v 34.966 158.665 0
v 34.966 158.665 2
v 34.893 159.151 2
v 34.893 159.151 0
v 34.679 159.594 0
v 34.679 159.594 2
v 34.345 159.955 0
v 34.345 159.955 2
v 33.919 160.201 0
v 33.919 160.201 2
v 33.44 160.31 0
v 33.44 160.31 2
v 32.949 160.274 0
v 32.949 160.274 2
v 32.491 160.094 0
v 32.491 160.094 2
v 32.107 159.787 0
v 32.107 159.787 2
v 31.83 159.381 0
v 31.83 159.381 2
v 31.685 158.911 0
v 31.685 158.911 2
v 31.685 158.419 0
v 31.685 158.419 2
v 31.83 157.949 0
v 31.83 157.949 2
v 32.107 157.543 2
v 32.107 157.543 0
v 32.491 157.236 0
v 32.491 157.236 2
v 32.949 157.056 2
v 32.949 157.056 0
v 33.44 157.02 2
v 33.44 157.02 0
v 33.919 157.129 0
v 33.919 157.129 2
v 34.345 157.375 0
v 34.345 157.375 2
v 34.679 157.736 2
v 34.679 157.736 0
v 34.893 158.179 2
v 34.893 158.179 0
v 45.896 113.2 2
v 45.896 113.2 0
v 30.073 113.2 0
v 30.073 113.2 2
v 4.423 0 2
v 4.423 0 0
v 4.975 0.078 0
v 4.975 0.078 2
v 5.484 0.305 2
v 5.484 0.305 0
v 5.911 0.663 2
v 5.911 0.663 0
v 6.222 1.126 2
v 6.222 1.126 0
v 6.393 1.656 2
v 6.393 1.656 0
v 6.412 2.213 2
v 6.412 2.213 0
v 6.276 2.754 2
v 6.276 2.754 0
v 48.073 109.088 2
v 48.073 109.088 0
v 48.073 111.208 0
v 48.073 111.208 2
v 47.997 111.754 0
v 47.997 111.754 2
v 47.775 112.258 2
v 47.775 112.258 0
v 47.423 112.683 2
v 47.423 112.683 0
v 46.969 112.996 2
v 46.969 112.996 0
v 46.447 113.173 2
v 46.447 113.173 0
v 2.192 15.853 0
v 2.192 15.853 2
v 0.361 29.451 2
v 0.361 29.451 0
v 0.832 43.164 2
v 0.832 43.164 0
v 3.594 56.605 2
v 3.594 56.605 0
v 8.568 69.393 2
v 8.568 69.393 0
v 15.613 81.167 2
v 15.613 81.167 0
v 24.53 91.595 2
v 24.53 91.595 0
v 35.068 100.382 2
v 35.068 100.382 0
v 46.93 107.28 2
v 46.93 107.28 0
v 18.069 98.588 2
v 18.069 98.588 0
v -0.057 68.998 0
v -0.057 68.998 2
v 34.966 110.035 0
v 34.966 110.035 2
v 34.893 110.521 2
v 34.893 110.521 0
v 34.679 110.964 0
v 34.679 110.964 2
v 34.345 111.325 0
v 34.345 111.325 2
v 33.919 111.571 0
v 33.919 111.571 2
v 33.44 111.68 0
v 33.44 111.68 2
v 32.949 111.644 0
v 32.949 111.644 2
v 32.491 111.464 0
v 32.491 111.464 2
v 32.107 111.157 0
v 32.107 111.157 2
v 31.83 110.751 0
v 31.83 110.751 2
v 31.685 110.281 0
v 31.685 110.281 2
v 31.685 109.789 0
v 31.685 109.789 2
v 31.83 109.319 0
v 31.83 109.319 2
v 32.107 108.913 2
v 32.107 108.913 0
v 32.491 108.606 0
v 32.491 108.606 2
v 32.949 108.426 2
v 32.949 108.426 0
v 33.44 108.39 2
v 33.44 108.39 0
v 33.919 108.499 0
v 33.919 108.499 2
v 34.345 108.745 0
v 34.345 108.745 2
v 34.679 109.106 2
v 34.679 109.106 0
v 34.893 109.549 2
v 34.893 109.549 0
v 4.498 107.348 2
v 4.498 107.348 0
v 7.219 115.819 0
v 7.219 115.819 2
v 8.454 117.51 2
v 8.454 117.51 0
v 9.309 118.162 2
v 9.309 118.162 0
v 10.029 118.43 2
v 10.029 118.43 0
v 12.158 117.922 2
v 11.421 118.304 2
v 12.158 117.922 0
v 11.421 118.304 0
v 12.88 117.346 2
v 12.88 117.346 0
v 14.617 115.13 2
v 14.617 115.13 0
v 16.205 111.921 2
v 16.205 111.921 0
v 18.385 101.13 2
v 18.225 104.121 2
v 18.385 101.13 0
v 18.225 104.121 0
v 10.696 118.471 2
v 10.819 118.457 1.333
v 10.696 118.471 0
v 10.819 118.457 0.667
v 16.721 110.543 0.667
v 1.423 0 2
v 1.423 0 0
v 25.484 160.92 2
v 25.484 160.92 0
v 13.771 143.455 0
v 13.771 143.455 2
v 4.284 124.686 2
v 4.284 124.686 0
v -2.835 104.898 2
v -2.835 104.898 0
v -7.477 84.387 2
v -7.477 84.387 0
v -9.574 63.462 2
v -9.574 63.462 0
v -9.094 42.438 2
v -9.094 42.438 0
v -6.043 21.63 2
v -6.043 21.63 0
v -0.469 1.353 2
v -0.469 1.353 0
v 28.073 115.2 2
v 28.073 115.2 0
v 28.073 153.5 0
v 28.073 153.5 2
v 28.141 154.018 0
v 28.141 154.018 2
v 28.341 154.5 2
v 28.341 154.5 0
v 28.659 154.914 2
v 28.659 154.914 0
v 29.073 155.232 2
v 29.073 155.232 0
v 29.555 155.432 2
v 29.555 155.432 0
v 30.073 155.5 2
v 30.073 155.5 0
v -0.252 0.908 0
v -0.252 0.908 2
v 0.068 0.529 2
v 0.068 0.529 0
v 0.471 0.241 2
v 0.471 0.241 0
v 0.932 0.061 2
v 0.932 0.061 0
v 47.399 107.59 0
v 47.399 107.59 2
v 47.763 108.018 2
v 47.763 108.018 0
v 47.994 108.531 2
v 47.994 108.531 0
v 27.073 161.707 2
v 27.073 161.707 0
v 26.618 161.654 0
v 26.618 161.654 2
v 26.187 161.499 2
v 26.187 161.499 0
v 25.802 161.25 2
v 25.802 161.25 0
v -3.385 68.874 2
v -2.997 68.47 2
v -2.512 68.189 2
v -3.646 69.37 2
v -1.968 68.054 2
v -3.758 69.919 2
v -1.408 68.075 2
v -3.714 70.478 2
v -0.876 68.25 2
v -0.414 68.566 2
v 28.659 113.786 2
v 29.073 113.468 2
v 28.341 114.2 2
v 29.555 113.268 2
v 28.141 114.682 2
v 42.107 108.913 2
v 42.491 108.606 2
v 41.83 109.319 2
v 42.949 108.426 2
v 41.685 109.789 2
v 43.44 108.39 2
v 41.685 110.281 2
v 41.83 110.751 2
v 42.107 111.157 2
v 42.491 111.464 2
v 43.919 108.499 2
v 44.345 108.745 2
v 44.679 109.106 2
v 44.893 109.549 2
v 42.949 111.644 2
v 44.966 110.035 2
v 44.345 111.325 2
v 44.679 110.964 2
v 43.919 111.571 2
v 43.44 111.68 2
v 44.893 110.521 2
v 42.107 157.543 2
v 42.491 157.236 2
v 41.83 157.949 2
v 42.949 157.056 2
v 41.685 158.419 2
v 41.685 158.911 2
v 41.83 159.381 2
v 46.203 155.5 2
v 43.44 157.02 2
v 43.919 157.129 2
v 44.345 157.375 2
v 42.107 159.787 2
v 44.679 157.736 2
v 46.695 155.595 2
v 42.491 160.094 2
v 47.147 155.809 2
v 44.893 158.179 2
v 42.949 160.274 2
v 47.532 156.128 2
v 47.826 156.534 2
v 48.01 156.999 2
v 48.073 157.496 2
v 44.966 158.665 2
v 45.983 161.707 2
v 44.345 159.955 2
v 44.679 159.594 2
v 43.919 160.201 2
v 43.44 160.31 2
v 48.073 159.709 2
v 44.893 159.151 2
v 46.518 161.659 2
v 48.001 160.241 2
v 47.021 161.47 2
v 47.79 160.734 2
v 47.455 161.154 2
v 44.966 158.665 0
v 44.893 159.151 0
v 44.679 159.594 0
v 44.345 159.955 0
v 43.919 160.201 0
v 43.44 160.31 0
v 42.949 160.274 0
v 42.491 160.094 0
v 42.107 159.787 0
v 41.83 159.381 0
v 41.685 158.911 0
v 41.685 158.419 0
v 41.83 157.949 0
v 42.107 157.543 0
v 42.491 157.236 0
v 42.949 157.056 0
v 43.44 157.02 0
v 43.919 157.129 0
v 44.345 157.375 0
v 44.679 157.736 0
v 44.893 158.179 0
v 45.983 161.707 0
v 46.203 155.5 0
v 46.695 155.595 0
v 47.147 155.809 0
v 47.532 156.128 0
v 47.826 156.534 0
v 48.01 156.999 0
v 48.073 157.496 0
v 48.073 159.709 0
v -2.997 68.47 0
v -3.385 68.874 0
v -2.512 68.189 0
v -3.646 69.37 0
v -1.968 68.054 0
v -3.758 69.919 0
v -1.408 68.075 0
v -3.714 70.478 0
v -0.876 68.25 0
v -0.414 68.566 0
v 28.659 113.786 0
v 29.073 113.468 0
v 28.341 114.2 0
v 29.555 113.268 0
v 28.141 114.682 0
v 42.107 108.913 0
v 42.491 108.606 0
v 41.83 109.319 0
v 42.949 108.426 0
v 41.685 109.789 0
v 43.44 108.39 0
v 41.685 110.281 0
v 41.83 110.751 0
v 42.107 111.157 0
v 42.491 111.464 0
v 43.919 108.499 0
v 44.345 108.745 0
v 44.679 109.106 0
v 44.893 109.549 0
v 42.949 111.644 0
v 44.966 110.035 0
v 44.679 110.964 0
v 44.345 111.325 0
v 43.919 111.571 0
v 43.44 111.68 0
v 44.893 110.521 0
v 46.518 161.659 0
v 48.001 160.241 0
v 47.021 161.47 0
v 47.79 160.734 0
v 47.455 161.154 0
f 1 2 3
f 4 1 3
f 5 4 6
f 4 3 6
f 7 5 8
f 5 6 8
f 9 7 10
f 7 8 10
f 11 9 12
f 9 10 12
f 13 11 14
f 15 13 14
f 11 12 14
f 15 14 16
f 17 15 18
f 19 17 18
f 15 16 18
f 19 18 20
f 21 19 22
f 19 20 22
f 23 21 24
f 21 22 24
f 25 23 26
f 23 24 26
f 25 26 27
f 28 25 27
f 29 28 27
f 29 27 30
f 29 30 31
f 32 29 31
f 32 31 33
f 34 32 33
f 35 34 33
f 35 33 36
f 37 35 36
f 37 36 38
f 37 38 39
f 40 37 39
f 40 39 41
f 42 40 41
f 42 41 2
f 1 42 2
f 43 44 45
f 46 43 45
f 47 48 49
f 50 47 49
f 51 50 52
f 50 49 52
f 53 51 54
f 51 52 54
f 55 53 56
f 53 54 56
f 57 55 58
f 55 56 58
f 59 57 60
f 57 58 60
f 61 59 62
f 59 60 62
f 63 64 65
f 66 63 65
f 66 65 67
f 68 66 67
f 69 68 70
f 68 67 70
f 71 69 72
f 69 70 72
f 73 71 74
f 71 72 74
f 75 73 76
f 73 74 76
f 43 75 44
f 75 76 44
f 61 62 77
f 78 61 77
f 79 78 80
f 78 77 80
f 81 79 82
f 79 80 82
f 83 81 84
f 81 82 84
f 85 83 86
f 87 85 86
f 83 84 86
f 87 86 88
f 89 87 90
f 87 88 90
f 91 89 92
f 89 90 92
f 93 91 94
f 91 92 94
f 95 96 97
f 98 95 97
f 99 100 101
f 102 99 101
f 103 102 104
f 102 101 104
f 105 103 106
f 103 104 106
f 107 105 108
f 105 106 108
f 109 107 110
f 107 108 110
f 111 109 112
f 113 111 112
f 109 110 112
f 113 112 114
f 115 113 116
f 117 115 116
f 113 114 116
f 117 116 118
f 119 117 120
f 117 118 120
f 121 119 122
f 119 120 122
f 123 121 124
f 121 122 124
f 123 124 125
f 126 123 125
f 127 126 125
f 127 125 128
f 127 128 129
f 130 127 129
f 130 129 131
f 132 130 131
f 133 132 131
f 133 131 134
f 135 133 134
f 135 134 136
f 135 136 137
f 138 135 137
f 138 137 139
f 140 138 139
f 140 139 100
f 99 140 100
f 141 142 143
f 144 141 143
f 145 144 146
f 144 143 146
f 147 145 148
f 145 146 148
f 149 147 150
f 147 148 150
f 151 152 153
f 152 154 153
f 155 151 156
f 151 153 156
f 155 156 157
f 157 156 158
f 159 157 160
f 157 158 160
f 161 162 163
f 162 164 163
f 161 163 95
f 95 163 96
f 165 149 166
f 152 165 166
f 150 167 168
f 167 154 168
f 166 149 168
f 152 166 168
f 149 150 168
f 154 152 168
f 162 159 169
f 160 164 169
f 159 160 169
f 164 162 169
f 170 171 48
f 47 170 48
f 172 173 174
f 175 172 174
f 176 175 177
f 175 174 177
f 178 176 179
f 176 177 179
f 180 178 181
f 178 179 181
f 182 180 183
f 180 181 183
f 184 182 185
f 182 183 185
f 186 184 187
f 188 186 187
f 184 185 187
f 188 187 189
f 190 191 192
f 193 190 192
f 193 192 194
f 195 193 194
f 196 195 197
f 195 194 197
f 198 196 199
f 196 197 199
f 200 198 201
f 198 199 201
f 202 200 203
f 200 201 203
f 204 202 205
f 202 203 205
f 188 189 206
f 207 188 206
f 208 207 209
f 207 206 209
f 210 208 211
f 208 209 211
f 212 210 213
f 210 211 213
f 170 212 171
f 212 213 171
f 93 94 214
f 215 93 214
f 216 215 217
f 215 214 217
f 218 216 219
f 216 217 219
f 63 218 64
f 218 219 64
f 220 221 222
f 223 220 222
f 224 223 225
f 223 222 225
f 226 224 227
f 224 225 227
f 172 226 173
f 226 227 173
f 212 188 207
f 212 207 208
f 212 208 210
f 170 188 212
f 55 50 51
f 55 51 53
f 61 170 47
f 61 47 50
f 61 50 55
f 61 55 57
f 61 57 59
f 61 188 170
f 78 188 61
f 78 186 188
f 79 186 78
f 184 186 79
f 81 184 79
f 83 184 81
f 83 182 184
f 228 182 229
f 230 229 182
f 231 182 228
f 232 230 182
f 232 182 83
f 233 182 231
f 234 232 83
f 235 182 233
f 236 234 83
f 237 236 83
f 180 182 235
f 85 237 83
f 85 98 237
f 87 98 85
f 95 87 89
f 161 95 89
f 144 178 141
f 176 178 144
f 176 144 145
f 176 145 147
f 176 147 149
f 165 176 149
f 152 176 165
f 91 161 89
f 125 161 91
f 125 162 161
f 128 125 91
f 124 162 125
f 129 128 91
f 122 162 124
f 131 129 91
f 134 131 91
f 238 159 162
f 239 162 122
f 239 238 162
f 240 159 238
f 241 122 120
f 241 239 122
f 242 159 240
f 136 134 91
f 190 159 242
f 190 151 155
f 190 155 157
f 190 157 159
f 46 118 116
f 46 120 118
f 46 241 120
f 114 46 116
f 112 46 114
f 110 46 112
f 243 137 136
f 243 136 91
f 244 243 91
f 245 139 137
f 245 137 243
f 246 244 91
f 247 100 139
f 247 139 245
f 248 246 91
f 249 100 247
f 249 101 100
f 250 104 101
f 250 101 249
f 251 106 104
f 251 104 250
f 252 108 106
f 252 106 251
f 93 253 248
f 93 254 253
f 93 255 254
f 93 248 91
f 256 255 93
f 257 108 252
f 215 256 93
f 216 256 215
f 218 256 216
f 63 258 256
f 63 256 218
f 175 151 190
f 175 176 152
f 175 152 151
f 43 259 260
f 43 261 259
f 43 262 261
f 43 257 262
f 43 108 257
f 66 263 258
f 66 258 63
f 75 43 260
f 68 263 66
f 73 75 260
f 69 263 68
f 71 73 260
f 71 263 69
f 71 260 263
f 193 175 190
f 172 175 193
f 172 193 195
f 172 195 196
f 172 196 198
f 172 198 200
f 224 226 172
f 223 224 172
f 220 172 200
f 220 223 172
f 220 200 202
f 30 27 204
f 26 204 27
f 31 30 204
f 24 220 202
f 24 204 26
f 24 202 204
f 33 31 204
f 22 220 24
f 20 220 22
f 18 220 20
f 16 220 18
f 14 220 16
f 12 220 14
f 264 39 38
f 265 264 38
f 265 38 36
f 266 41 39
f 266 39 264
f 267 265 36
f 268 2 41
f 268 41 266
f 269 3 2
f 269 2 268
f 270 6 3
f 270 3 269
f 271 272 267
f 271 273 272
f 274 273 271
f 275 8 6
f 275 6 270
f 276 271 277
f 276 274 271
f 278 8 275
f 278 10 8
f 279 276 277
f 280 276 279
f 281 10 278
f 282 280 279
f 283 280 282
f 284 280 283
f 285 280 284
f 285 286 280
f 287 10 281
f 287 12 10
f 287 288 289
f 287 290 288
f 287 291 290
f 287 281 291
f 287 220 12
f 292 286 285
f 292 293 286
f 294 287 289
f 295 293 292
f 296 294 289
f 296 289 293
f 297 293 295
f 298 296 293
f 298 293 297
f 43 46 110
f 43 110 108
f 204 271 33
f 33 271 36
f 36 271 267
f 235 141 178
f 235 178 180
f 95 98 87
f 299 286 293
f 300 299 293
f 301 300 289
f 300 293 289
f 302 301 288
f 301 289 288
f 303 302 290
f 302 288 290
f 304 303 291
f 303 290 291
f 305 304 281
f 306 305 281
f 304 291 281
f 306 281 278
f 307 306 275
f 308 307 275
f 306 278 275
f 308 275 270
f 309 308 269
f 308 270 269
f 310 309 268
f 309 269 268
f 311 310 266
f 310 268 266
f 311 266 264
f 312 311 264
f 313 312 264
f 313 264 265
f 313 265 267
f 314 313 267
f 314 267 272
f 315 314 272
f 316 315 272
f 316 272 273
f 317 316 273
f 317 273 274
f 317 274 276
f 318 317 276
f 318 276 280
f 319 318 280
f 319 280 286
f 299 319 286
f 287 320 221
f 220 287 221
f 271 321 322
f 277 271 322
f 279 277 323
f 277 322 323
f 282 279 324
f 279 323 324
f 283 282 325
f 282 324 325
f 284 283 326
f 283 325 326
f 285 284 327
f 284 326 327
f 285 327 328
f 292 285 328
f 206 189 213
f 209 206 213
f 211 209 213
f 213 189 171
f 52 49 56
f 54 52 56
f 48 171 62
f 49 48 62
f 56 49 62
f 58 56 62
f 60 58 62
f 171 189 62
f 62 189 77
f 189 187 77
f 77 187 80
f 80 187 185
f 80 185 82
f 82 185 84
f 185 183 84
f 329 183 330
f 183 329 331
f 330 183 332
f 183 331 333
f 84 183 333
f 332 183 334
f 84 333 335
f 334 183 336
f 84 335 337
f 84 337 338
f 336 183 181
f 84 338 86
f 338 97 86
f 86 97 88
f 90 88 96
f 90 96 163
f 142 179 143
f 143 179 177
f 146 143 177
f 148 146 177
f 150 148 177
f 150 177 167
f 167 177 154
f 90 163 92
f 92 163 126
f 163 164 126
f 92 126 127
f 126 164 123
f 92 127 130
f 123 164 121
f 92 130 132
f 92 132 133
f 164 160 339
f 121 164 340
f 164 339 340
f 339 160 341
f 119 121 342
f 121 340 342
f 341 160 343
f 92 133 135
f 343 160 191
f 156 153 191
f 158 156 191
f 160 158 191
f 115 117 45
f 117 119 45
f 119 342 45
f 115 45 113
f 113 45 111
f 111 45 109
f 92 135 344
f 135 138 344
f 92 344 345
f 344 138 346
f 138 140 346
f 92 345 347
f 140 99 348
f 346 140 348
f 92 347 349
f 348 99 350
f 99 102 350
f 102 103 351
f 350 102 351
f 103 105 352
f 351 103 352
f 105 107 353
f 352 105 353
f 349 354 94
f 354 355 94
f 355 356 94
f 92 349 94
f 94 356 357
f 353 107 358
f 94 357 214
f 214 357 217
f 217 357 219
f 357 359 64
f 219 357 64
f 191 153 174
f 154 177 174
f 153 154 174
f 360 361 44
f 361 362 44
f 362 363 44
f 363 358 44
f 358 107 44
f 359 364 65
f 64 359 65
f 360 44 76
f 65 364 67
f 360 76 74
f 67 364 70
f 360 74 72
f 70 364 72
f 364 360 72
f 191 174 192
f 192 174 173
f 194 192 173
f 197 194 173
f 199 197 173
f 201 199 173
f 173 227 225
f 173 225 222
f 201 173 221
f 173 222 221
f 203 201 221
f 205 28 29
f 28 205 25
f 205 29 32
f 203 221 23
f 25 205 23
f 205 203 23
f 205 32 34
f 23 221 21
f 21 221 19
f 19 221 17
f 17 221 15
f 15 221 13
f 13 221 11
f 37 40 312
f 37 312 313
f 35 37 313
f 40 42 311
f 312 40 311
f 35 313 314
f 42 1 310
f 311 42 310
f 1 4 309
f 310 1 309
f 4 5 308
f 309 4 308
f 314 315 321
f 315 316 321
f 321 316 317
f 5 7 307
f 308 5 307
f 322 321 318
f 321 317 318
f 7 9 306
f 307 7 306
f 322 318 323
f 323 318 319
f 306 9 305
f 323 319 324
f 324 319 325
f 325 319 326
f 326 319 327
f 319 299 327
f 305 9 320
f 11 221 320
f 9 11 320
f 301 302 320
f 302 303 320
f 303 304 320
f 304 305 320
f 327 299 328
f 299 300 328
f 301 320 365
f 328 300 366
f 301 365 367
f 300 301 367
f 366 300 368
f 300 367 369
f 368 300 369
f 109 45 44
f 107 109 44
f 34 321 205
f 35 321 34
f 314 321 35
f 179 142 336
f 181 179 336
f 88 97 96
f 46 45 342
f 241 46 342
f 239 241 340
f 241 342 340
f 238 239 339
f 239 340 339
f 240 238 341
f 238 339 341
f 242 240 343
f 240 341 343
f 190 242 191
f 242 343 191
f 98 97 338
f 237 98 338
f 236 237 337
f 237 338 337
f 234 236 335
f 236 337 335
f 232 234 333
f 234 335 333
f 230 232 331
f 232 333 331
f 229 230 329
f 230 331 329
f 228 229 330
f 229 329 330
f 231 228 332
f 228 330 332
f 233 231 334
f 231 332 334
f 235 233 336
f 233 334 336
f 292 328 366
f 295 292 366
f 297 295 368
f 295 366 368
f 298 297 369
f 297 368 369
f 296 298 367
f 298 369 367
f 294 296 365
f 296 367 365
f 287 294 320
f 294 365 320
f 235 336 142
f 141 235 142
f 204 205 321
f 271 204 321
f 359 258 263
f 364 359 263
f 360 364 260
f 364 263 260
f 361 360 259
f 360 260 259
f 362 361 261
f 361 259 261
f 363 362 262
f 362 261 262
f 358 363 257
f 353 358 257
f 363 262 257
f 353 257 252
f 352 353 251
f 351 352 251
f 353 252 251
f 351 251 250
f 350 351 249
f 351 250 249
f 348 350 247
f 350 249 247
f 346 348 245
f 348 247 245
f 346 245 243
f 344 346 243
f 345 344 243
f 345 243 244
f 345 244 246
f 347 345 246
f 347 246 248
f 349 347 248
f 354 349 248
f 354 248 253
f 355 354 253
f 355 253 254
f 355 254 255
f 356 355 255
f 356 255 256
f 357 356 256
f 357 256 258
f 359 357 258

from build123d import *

# Parameters (mm, degrees)
EXTRUDE_1_DEPTH     = 2
SKETCH_2_R          = 1.65
CUT_EXTRUDE_1_DEPTH = 3.0000001


with BuildPart() as part:
    # 草图1 → 凸台-拉伸1 (new body)
    with BuildSketch(Plane.XY):
        with BuildLine():
            Line((1.423252987, 0), (4.423252987, 0))
            ThreePointArc((4.423252987, 0), (6.082636631, 0.883556575), (6.275860947, 2.753554078))
            ThreePointArc((6.275860947, 2.753554078), (5.811551363, 63.103247136), (46.929512186, 107.280326411))
            ThreePointArc((46.929512186, 107.280326411), (47.763039313, 108.018300592), (48.072882653, 109.087585618))
            Line((48.072882653, 109.087585618), (48.072882653, 111.207813928))
            ThreePointArc((48.072882653, 111.207813928), (47.423208509, 112.683151206), (45.89626257, 113.2))
            Line((45.89626257, 113.2), (30.072910523, 113.2))
            ThreePointArc((30.072910523, 113.2), (28.658696961, 113.785786438), (28.072910523, 115.2))
            Line((28.072910523, 115.2), (28.072910523, 153.5))
            ThreePointArc((28.072910523, 153.5), (28.658696961, 154.914213563), (30.072910523, 155.5))
            Line((30.072910523, 155.5), (46.202994429, 155.5))
            ThreePointArc((46.202994429, 155.5), (47.532372899, 156.128324681), (48.072882653, 157.495763244))
            Line((48.072882653, 157.495763244), (48.072882653, 159.708737404))
            ThreePointArc((48.072882653, 159.708737404), (47.455107078, 161.15423235), (45.983427014, 161.706735824))
            Line((45.983427014, 161.706735824), (27.073474975, 161.706735824))
            ThreePointArc((27.073474975, 161.706735824), (26.186750001, 161.499420632), (25.483856586, 160.920454645))
            ThreePointArc((25.483856586, 160.920454645), (-7.477274918, 84.38693582), (-0.469066984, 1.352601263))
            ThreePointArc((-0.469066984, 1.352601263), (0.260239117, 0.372917108), (1.423252987, 0))
        make_face()
        with BuildLine():
            Line((-3.714345647, 70.477818401), (4.498485812, 107.347765252))
            add(Edge.make_bspline(
                [(4.498485812, 107.347765252), (9.65057542, 132.963079711), (20.376969719, 107.570049249), (18.069358559, 98.588262366)],
                knots=[0, 0, 0, 0, 1, 1, 1, 1], degree=3))
            Line((18.069358559, 98.588262366), (-0.056738646, 68.998256027))
            ThreePointArc((-0.056738646, 68.998256027), (-2.512185077, 68.188921333), (-3.714345647, 70.477818401))
        make_face(mode=Mode.SUBTRACT)
    extrude(amount=EXTRUDE_1_DEPTH)

    # 草图2 → 切除-拉伸1 (cut, through all)
    with BuildSketch(Plane.XY.offset(2)):
        with Locations((43.316196674, 158.665)):
            Circle(SKETCH_2_R)
        with Locations((33.316196674, 158.665)):
            Circle(SKETCH_2_R)
        with Locations((43.316196674, 110.035)):
            Circle(SKETCH_2_R)
        with Locations((33.316196674, 110.035)):
            Circle(SKETCH_2_R)
    extrude(amount=-CUT_EXTRUDE_1_DEPTH, mode=Mode.SUBTRACT)


solid = part.part
